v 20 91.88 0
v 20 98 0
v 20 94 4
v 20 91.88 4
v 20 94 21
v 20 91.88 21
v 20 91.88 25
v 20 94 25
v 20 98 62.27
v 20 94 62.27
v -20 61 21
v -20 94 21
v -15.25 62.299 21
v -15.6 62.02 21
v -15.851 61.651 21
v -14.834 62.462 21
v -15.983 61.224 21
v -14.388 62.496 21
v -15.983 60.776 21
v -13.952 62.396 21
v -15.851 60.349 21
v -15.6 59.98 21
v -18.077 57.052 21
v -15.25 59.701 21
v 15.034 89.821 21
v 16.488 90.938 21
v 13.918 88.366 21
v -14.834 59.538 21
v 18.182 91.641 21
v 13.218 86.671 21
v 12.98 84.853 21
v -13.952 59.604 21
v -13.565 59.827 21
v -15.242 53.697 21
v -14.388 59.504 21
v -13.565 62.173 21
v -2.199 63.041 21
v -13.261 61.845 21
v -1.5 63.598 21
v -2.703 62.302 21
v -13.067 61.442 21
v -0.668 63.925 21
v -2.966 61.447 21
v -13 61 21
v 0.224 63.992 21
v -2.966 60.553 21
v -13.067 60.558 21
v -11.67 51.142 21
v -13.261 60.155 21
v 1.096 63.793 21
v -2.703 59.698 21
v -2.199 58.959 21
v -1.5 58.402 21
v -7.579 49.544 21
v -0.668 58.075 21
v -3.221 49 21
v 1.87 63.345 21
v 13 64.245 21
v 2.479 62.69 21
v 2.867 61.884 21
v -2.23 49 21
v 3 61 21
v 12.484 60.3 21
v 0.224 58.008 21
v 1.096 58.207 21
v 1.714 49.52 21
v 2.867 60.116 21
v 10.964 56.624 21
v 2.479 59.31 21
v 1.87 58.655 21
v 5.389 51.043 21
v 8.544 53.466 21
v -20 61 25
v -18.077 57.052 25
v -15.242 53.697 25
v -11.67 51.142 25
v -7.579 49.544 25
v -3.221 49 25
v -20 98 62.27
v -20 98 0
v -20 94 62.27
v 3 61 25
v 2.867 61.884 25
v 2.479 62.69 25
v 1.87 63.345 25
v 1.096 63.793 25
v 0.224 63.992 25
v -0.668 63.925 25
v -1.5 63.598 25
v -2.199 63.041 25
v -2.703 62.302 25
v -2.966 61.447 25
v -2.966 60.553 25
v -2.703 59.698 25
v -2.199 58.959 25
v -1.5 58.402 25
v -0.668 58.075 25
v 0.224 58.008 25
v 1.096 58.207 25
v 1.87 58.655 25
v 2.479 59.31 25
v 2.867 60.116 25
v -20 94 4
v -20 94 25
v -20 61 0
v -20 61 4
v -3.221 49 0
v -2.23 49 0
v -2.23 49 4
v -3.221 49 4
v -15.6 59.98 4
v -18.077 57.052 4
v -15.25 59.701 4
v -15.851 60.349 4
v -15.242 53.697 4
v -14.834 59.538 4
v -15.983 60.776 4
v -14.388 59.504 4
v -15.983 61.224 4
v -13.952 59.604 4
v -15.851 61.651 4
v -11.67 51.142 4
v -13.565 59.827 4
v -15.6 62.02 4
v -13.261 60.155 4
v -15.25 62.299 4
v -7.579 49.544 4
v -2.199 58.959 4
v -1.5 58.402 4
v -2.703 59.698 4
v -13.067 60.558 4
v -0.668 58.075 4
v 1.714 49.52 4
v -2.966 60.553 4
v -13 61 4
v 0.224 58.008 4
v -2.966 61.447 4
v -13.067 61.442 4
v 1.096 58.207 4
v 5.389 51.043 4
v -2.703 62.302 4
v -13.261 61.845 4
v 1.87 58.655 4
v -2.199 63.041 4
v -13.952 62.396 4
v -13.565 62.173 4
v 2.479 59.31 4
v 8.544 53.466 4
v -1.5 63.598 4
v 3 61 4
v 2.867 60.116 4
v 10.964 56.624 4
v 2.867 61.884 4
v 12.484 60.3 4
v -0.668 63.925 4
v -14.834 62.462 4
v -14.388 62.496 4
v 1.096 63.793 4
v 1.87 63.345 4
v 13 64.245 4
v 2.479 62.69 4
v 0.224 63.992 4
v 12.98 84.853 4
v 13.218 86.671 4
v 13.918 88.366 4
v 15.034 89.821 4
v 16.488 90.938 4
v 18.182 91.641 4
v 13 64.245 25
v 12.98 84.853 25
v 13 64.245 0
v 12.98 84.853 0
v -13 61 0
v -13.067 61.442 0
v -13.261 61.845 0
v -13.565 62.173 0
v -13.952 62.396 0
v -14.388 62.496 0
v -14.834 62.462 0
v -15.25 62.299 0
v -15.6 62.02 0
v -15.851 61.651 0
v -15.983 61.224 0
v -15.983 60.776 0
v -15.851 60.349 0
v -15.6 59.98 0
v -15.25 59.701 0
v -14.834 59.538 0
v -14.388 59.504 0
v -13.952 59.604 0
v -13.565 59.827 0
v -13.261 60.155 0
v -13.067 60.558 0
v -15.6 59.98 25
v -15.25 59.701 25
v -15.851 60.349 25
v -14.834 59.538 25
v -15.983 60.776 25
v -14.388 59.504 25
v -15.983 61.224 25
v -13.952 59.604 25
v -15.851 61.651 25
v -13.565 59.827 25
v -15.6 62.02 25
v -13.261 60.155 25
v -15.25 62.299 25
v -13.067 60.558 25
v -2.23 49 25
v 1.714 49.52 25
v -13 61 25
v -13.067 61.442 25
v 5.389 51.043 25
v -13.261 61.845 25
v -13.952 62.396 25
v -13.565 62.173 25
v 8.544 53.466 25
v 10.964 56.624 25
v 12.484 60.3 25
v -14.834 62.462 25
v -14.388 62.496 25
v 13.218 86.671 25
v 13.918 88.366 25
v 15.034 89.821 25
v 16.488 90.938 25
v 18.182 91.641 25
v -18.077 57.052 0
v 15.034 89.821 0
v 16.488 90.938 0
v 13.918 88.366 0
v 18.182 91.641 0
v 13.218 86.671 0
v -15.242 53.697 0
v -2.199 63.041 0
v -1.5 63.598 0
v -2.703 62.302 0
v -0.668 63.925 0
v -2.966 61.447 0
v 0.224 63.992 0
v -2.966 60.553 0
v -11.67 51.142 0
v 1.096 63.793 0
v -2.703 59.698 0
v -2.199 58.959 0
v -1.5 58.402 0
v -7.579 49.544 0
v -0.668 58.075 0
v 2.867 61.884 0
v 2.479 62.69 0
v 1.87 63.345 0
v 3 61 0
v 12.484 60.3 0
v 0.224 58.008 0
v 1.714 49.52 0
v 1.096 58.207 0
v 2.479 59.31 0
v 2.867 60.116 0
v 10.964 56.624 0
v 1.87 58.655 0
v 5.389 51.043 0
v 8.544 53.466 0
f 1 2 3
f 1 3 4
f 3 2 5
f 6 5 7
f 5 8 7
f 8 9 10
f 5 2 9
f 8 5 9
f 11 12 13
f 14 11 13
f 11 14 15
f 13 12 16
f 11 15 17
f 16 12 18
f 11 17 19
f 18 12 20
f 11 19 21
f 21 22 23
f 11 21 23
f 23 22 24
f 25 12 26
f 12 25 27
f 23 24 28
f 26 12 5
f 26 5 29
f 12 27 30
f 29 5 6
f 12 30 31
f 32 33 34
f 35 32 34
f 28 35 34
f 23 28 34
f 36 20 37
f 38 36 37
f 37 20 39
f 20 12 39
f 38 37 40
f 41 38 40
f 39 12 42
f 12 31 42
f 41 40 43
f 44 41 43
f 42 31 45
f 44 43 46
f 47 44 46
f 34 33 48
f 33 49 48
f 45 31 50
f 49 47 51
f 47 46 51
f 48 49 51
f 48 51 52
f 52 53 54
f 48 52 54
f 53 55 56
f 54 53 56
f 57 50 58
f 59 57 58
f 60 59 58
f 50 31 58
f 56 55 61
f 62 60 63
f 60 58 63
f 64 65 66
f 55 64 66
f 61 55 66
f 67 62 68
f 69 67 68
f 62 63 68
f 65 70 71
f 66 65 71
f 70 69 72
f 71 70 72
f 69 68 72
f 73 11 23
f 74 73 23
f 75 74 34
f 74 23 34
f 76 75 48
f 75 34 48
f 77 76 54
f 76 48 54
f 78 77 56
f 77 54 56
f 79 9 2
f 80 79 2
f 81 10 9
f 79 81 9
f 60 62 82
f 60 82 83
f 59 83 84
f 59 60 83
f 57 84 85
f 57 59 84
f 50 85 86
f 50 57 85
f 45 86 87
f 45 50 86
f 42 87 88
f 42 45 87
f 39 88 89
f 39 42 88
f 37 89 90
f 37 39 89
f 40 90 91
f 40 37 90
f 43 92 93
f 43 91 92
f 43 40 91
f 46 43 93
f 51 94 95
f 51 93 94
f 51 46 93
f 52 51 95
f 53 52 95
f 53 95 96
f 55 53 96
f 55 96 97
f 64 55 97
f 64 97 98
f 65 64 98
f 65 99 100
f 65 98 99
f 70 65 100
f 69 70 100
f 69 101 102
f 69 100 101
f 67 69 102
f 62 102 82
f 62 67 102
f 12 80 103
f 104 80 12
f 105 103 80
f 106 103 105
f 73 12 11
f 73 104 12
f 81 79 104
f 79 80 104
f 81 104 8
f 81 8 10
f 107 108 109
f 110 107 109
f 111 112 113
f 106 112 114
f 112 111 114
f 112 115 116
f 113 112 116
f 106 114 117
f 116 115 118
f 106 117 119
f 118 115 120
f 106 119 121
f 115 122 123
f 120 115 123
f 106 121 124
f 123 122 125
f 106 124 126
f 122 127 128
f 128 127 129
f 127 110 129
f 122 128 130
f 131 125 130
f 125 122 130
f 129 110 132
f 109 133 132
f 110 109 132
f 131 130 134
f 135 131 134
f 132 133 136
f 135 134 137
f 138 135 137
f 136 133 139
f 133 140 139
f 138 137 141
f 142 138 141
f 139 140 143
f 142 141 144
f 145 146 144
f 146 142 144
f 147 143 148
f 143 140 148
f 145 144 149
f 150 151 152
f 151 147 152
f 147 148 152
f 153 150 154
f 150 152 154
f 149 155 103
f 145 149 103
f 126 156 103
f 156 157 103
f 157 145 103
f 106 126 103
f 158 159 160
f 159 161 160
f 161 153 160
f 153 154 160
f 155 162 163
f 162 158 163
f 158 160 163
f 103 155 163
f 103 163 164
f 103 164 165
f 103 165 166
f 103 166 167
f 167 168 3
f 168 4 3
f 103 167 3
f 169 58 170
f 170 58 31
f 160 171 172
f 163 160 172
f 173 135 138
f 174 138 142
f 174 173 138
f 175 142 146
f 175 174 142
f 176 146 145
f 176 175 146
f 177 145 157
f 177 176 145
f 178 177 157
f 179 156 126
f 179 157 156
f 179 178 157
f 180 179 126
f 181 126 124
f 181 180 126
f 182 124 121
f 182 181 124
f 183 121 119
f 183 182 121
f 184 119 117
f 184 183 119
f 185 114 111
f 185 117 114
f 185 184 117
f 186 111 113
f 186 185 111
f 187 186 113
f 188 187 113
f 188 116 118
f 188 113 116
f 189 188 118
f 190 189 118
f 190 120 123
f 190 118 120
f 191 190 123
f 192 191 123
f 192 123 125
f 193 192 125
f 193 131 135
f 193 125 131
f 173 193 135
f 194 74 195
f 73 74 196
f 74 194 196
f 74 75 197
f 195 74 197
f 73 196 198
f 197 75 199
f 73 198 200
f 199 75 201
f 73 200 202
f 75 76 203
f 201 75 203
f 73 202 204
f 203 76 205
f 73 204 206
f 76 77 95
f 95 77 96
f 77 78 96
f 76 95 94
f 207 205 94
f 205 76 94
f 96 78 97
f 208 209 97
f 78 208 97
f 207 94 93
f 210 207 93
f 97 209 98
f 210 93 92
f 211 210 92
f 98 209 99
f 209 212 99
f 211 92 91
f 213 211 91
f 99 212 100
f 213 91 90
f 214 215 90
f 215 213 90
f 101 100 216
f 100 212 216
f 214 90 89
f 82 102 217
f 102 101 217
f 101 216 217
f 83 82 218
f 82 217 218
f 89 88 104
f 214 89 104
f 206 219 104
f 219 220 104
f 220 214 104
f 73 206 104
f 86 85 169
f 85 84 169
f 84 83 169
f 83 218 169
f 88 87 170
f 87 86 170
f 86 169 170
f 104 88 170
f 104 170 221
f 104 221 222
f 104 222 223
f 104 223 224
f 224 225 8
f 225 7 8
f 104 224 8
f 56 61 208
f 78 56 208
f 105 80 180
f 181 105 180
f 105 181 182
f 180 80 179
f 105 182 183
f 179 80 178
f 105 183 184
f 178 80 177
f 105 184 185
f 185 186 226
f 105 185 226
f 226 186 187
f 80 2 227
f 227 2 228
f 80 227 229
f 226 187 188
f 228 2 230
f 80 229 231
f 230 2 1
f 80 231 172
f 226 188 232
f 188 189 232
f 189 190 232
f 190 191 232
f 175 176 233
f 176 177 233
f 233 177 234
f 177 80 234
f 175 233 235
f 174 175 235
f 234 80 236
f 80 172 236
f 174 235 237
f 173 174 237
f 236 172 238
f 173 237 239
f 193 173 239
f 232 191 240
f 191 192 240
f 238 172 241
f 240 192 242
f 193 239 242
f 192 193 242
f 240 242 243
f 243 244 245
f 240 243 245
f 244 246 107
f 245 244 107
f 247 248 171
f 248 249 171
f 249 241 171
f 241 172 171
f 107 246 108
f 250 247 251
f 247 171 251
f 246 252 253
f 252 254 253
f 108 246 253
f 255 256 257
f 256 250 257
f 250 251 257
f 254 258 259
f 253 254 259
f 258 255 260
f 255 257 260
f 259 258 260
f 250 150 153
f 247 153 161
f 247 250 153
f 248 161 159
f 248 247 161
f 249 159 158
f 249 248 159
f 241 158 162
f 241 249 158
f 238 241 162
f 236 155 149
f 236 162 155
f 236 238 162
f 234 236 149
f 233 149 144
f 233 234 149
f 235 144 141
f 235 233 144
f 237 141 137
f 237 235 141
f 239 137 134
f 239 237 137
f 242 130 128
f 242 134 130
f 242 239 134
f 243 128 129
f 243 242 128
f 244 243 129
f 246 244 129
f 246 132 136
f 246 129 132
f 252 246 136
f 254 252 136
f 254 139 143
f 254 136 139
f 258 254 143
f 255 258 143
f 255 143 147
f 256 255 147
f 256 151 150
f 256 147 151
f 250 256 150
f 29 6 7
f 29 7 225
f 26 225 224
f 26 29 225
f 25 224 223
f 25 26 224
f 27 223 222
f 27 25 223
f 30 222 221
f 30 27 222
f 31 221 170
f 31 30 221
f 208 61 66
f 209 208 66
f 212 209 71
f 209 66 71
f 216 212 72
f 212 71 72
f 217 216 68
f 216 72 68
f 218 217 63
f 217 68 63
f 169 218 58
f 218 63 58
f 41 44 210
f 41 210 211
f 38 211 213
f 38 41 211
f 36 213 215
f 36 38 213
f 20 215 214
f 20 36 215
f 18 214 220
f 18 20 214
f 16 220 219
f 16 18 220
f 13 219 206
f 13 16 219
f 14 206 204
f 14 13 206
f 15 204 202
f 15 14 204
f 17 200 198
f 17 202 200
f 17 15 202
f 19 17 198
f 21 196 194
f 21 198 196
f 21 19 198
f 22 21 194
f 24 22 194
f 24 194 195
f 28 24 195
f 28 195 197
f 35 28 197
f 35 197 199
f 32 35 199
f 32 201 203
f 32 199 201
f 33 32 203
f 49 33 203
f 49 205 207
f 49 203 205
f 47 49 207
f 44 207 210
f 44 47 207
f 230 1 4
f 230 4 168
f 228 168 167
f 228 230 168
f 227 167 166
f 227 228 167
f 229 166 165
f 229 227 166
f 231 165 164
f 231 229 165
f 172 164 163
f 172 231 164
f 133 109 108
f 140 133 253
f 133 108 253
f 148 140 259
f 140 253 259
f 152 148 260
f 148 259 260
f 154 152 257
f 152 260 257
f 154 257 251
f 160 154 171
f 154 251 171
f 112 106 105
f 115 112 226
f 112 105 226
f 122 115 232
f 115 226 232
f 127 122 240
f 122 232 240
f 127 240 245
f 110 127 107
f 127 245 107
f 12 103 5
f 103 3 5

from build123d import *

# Parameters (mm, degrees)
PAD009_DEPTH         = 20
SKETCH017_R          = 3
POCKET005_DEPTH      = 62.271
SKETCH018_R          = 1.5
POCKET006_DEPTH      = 0.001
POCKET006_DEPTH_BACK = 62.271


with BuildPart() as part:
    # Sketch016 → Pad009 (new body, symmetric)
    with BuildSketch(Plane.YZ):
        Polygon((0, 62.27), (0, 0), (-49, 0), (-49, 4), (-4, 4), (-4, 21), (-49, 21), (-49, 25), (-4, 25), (-4, 62.27), align=None)
    extrude(amount=PAD009_DEPTH, both=True)

    # Sketch017 → Pocket005 (cut, through all)
    with BuildSketch(Plane.XY):
        with Locations((0, -37)):
            Circle(SKETCH017_R)
    extrude(amount=POCKET005_DEPTH, mode=Mode.SUBTRACT)

    # Sketch018 → Pocket006 (cut, two sides)
    with BuildSketch(Plane.XY) as pocket006_sk:
        with Locations((-14.5, -37)):
            Circle(SKETCH018_R)
        with BuildLine():
            ThreePointArc((-20, -37), (-13.535443, -45.691314), (-3.221276, -49))
            Line((-3.221276, -49), (-2.229993, -49))
            ThreePointArc((-2.229993, -49), (8.544467, -44.53401), (13, -33.755222))
            Line((13, -33.755222), (12.980003, -13.146812))
            ThreePointArc((20, -6.12), (15.033703, -8.178519), (12.980003, -13.146812))
            Line((20, -6.12), (20, -54.21))
            Line((20, -54.21), (-20, -54.21))
            Line((-20, -37), (-20, -54.21))
        make_face()
    extrude(amount=-POCKET006_DEPTH, mode=Mode.SUBTRACT)
    extrude(pocket006_sk.sketch, amount=POCKET006_DEPTH_BACK, mode=Mode.SUBTRACT)


with BuildPart() as part_1:
    # Body004 placement: moved
    add(part.part.moved(Location((0, 98, 0))))


solid = part_1.part
